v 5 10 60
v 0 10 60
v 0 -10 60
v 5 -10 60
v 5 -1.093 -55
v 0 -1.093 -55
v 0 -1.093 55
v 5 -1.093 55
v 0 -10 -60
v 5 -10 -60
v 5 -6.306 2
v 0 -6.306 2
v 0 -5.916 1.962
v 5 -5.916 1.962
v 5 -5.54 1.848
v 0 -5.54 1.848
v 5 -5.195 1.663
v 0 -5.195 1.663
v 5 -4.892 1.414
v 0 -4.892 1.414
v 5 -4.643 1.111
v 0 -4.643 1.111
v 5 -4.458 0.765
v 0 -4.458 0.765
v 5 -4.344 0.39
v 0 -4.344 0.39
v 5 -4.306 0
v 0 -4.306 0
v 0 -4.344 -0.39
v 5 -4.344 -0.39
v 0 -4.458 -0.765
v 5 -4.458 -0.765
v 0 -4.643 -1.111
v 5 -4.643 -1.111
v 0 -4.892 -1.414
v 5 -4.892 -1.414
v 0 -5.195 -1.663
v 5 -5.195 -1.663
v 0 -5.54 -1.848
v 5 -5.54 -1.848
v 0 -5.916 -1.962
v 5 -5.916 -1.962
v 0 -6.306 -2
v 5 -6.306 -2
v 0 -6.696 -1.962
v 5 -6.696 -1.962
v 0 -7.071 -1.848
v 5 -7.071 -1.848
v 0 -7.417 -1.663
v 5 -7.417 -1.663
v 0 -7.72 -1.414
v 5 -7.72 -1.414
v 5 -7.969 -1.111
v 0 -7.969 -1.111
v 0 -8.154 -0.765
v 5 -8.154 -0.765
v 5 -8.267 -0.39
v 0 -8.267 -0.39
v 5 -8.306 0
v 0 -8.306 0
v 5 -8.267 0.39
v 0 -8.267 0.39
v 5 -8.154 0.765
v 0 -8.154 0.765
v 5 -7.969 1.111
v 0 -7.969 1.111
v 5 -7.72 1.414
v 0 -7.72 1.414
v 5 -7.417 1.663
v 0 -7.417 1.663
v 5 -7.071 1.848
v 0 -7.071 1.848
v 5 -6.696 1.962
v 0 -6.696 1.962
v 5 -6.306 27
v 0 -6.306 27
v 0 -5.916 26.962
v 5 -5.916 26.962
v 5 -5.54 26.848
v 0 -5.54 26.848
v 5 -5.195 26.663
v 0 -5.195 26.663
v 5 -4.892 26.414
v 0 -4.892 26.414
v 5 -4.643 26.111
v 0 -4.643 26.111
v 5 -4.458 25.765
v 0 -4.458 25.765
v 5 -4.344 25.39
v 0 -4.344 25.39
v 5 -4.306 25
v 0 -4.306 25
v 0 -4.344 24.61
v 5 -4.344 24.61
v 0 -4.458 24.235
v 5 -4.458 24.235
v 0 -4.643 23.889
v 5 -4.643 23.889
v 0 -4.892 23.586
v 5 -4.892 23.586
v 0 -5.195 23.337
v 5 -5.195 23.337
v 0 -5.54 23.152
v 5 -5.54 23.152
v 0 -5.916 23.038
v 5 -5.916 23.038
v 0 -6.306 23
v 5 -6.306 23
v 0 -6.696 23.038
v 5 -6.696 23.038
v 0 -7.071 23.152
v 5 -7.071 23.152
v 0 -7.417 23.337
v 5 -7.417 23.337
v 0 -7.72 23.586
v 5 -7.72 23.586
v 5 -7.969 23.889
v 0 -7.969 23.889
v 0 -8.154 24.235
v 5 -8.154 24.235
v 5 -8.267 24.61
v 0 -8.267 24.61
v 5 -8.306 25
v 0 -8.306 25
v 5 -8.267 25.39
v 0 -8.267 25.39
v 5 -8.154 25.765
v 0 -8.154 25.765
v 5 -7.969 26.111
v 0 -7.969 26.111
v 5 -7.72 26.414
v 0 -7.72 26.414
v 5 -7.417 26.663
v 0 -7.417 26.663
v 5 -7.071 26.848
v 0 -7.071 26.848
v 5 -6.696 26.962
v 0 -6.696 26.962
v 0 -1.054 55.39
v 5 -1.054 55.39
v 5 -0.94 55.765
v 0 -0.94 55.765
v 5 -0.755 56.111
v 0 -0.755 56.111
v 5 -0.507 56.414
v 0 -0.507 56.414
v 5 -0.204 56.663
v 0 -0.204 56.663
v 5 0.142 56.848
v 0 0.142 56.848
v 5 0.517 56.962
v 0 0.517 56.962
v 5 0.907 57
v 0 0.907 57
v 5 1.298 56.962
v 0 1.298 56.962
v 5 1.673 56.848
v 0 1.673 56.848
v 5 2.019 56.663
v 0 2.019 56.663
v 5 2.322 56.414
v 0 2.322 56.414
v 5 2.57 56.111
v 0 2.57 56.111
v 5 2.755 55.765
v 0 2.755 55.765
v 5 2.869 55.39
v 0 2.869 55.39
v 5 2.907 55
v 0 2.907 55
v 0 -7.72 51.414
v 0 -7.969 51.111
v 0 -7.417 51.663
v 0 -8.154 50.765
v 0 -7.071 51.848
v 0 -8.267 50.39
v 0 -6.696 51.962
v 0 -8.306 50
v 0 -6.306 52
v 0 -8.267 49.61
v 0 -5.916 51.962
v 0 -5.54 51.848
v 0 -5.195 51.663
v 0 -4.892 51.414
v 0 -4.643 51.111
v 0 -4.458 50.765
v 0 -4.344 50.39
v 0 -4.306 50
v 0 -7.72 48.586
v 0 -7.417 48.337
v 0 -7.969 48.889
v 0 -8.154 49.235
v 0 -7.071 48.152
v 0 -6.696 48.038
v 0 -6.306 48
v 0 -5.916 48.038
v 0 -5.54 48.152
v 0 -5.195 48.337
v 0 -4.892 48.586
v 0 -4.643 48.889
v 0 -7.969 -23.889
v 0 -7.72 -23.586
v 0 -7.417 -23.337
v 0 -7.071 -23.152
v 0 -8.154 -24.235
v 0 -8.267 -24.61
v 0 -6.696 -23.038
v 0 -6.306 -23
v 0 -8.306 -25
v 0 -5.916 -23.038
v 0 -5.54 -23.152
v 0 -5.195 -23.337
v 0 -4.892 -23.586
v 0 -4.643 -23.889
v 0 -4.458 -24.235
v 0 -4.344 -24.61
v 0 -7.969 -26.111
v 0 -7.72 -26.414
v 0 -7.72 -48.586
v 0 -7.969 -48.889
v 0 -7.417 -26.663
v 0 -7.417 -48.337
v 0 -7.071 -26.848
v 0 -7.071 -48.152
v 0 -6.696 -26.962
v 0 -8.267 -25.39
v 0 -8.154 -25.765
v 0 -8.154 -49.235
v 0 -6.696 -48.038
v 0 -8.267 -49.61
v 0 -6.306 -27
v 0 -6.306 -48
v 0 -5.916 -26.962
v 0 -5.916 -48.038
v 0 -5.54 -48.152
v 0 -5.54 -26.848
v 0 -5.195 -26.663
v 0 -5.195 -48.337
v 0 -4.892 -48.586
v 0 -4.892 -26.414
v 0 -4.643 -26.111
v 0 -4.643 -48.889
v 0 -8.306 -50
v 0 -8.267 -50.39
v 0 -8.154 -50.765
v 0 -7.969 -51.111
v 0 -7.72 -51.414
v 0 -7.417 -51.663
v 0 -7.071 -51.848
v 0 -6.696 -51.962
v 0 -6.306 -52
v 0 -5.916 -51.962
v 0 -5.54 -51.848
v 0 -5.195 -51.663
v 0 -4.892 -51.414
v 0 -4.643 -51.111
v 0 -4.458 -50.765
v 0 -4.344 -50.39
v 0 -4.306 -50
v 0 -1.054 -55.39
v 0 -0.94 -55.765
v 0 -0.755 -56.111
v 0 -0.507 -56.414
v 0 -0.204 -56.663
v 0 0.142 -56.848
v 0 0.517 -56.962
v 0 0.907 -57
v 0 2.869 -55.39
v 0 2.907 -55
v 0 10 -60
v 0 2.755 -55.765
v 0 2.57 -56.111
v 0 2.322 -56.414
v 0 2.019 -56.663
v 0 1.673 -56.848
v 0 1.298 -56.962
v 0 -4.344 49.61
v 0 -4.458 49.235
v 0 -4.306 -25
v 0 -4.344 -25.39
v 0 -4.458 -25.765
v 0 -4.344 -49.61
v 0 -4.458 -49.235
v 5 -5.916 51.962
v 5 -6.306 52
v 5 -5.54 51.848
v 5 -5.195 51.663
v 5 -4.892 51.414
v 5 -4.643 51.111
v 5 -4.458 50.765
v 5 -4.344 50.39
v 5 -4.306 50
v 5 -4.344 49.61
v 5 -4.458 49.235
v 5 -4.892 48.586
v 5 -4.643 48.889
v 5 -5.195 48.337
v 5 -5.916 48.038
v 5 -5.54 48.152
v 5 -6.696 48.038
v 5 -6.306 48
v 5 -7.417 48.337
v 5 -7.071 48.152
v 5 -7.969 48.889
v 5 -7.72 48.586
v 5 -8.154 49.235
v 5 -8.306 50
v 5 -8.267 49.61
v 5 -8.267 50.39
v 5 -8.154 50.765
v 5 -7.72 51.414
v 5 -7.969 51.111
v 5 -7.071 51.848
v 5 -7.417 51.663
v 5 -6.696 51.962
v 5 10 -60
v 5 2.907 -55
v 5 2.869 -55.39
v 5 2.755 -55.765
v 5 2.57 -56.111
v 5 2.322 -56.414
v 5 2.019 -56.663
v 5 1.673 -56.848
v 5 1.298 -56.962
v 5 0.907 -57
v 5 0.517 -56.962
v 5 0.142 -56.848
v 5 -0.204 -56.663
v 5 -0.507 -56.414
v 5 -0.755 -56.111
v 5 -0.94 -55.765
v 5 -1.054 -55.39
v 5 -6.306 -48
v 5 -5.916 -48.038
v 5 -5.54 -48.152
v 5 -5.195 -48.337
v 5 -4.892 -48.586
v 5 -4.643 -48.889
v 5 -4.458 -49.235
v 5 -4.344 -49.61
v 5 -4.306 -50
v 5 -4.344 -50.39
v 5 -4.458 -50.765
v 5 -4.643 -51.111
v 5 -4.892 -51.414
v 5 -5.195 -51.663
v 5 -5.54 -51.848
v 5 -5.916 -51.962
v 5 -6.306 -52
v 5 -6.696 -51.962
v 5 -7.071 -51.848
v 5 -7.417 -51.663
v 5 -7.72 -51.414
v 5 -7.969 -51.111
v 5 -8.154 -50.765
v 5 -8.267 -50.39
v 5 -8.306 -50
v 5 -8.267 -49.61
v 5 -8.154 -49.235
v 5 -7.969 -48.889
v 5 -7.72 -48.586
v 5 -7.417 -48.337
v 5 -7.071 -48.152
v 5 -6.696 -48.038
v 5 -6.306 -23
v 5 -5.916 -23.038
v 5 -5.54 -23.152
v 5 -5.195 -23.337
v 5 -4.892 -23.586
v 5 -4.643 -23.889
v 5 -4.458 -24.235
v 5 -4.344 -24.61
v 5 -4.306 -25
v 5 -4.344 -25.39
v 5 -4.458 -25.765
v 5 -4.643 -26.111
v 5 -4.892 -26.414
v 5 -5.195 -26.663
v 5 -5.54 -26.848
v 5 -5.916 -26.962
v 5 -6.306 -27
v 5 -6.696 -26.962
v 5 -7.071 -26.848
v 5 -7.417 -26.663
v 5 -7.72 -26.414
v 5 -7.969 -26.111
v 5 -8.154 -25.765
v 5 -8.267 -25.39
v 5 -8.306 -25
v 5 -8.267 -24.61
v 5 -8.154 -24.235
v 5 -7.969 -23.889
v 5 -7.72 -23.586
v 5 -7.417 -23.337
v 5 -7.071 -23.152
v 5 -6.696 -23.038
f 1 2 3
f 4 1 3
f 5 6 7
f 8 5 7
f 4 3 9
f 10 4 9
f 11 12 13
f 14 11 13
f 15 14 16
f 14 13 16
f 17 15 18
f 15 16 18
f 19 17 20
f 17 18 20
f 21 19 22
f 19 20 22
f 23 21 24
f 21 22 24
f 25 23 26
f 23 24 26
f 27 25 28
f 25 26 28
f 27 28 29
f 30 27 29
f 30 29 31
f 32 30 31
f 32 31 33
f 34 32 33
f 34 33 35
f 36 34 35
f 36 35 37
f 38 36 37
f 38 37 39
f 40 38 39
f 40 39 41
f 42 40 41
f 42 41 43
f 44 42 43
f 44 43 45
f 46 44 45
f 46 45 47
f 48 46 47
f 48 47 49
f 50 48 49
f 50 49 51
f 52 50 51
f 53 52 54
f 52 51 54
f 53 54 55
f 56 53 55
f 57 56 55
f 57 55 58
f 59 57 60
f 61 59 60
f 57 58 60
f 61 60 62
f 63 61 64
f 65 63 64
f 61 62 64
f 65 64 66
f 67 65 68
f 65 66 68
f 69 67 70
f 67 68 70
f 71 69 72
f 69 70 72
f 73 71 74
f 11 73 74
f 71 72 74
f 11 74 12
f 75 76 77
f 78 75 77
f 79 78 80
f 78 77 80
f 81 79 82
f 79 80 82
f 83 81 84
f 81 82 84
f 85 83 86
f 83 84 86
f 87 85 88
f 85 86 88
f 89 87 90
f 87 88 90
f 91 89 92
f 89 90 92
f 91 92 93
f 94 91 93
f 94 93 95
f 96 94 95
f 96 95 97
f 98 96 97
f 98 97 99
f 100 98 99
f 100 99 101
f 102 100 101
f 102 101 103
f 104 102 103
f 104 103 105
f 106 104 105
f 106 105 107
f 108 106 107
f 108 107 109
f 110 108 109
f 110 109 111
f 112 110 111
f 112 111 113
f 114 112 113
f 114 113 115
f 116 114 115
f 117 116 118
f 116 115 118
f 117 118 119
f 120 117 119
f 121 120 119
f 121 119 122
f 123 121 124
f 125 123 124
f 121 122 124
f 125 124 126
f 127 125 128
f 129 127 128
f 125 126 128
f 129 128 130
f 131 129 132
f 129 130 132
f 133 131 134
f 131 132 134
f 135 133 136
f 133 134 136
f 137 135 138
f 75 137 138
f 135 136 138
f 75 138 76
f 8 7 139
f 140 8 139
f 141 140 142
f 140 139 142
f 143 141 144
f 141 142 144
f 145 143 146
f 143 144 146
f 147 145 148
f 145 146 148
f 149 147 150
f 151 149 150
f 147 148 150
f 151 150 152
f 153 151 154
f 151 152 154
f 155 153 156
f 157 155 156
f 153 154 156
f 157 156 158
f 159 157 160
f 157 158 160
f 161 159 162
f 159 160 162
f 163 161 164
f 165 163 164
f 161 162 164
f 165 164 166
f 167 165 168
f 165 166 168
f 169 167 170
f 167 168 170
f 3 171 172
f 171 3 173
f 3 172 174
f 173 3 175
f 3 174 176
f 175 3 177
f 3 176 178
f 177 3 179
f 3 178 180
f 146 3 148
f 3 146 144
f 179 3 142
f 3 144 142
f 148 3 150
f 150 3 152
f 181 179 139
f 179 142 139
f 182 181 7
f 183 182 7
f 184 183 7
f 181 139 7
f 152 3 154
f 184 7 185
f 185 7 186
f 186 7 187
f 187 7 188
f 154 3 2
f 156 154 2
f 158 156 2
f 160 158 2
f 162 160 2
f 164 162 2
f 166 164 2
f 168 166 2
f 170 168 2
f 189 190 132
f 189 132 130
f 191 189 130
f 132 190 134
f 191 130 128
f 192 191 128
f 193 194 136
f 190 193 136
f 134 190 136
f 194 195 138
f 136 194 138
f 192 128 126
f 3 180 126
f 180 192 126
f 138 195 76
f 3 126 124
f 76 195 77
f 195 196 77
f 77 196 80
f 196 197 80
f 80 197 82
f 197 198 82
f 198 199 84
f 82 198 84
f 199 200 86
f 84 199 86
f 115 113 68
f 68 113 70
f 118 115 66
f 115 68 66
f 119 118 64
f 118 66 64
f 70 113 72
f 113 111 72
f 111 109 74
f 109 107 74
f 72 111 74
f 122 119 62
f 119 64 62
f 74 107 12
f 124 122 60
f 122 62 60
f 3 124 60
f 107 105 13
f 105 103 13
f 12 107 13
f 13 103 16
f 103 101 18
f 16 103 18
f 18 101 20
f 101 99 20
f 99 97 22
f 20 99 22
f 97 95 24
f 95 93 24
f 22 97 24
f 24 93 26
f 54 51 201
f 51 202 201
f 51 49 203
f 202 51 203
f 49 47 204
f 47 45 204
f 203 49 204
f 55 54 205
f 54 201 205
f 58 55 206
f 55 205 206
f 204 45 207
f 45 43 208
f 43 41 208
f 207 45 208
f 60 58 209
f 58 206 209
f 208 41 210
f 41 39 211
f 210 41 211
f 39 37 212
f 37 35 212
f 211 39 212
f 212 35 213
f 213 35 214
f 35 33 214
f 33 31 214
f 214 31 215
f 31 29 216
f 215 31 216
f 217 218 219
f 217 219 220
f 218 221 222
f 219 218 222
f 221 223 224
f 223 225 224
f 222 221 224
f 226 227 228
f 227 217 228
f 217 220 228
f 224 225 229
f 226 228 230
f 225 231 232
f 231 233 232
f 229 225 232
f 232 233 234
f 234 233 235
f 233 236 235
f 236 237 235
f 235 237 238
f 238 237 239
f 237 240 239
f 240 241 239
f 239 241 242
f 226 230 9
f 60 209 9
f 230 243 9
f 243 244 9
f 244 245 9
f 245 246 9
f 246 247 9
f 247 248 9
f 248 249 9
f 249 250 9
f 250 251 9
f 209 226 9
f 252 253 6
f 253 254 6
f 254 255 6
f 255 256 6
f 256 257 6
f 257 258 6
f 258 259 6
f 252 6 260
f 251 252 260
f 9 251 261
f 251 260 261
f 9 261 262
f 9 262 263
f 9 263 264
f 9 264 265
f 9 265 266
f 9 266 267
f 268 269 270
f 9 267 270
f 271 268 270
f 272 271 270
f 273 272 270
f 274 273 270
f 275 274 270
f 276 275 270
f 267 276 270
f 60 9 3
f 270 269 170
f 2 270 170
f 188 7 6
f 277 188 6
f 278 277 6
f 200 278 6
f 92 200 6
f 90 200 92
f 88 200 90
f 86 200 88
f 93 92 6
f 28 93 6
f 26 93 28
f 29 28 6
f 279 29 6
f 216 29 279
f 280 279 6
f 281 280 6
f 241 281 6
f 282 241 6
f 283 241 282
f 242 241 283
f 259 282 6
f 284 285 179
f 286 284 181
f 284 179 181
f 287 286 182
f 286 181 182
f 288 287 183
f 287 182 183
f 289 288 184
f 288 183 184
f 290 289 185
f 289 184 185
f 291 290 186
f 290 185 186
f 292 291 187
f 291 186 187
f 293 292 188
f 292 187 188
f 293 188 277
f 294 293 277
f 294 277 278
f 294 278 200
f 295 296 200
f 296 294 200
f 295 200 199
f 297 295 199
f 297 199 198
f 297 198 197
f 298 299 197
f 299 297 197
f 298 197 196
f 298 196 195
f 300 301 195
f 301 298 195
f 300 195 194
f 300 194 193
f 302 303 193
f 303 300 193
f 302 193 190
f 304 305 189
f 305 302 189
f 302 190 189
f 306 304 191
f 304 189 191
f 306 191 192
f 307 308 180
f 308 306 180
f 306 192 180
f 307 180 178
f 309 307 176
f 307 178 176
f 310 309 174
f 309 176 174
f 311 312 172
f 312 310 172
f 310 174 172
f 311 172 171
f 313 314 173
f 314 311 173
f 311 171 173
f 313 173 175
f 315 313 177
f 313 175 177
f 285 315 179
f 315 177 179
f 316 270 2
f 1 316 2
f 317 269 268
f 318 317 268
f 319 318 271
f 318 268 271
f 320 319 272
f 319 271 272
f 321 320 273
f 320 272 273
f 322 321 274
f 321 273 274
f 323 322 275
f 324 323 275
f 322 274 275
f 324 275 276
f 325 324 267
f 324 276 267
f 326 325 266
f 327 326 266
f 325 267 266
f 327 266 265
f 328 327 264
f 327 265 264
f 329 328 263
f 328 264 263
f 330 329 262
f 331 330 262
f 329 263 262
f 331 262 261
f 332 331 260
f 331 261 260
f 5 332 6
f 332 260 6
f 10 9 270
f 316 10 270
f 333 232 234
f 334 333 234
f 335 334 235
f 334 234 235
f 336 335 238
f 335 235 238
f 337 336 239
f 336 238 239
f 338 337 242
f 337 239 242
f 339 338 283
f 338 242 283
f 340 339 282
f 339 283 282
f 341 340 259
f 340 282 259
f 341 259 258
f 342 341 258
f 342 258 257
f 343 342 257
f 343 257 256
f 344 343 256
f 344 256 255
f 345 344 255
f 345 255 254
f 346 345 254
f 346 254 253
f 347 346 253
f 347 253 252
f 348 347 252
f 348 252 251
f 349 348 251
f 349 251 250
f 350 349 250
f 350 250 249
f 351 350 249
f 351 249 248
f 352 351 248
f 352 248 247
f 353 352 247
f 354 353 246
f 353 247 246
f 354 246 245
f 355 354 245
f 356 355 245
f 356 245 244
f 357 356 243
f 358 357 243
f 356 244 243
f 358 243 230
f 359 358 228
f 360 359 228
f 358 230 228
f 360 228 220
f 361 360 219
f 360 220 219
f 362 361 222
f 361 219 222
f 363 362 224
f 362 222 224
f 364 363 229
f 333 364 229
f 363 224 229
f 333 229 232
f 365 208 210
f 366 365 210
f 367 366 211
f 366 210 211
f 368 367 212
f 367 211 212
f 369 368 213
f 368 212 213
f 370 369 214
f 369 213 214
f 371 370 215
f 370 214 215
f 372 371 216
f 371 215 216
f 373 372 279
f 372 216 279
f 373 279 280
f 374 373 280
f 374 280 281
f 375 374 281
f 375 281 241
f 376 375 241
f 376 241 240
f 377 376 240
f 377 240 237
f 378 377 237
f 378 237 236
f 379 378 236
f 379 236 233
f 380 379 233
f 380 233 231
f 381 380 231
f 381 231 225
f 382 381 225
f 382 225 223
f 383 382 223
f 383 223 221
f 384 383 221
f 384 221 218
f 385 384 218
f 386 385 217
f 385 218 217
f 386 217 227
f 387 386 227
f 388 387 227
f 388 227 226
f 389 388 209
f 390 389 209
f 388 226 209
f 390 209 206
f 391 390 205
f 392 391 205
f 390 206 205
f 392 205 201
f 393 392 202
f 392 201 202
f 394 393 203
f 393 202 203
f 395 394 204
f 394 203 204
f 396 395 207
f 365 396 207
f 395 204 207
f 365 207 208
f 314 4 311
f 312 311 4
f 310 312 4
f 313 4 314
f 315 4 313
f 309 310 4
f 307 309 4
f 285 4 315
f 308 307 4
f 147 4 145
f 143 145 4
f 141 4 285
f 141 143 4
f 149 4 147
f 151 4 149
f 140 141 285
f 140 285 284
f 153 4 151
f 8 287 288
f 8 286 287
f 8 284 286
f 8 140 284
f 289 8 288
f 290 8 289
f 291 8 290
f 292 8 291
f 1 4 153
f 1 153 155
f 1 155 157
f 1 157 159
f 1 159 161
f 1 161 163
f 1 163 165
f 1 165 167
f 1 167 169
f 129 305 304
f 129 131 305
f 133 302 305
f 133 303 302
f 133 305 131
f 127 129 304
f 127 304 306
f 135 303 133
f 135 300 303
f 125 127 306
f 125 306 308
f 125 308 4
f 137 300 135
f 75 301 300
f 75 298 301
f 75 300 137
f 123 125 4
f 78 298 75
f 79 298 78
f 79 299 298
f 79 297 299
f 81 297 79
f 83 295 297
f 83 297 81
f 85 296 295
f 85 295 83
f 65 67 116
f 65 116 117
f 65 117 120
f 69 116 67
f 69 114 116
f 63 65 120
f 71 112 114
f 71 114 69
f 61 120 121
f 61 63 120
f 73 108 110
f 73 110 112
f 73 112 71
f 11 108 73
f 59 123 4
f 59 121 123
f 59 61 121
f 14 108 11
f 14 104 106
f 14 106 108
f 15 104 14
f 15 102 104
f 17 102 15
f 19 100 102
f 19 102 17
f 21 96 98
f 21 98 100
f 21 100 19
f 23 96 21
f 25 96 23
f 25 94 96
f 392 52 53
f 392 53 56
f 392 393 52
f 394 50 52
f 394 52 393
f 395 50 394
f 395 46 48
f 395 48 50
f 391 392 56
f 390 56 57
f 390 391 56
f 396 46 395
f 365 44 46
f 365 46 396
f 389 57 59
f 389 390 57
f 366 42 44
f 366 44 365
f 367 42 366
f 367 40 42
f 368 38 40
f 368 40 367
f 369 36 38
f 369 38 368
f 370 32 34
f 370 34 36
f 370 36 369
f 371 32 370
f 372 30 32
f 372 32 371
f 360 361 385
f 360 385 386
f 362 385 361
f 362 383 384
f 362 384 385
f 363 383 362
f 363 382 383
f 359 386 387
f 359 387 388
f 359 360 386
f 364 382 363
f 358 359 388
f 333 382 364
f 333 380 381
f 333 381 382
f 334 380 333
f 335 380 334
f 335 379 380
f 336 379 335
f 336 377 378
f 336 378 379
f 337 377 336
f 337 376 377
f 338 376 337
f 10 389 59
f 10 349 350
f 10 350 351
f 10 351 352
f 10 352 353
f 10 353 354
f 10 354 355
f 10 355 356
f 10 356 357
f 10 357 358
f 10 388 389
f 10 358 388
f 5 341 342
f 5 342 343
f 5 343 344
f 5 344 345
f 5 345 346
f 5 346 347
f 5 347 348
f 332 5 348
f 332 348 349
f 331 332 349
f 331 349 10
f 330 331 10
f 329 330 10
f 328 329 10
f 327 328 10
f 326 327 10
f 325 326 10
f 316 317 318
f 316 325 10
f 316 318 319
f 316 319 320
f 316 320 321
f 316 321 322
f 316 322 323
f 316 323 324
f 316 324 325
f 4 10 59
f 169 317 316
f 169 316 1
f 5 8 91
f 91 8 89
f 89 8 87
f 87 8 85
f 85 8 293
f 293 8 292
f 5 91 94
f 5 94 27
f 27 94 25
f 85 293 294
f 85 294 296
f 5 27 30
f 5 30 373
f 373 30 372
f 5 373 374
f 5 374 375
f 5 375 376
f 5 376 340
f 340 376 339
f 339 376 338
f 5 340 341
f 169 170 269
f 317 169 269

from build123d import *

# Parameters (mm, degrees)
EXTRUDE_1_DEPTH = 5


with BuildPart() as part:
    # 草图2 → 凸台-拉伸1 (new body)
    # profile 1 of 2: a face of its own
    with BuildSketch(Plane(origin=(0, 0, 0), x_dir=(0, 0, -1), z_dir=(1, 0, 0))):
        with BuildLine():
            ThreePointArc((-52, -6.305745823), (-50, -4.305745823), (-48, -6.305745823))
            Line((-48, -6.305745823), (-27, -6.305745823))
            ThreePointArc((-27, -6.305745823), (-25, -4.305745823), (-23, -6.305745823))
            Line((-23, -6.305745823), (-2, -6.305745823))
            ThreePointArc((-2, -6.305745823), (0, -4.305745823), (2, -6.305745823))
            Line((2, -6.305745823), (23, -6.305745823))
            ThreePointArc((23, -6.305745823), (25, -4.305745823), (27, -6.305745823))
            Line((27, -6.305745823), (48, -6.305745823))
            ThreePointArc((48, -6.305745823), (50, -4.305745823), (52, -6.305745823))
            Line((52, -6.305745823), (60, -6.305745823))
            Line((60, -6.305745823), (60, 10))
            Line((60, 10), (-60, 10))
            Line((-60, 10), (-60, -6.305745823))
            Line((-60, -6.305745823), (-52, -6.305745823))
        make_face()
        with BuildLine():
            Line((55, -1.09255297), (-55, -1.09255297))
            ThreePointArc((-55, -1.09255297), (-57, 0.90744703), (-55, 2.90744703))
            Line((-55, 2.90744703), (55, 2.90744703))
            ThreePointArc((55, 2.90744703), (57, 0.90744703), (55, -1.09255297))
        make_face(mode=Mode.SUBTRACT)
    # profile 2 of 2: a face of its own
    with BuildSketch(Plane(origin=(0, 0, 0), x_dir=(0, 0, -1), z_dir=(1, 0, 0))):
        with BuildLine():
            Line((-27, -6.305745823), (-48, -6.305745823))
            ThreePointArc((-48, -6.305745823), (-50, -8.305745823), (-52, -6.305745823))
            Line((-52, -6.305745823), (-60, -6.305745823))
            Line((-60, -6.305745823), (-60, -10))
            Line((-60, -10), (60, -10))
            Line((60, -10), (60, -6.305745823))
            Line((60, -6.305745823), (52, -6.305745823))
            ThreePointArc((52, -6.305745823), (50, -8.305745823), (48, -6.305745823))
            Line((48, -6.305745823), (27, -6.305745823))
            ThreePointArc((27, -6.305745823), (25, -8.305745823), (23, -6.305745823))
            Line((23, -6.305745823), (2, -6.305745823))
            ThreePointArc((2, -6.305745823), (0, -8.305745823), (-2, -6.305745823))
            Line((-2, -6.305745823), (-23, -6.305745823))
            ThreePointArc((-23, -6.305745823), (-25, -8.305745823), (-27, -6.305745823))
        make_face()
    extrude(amount=EXTRUDE_1_DEPTH)


solid = part.part
